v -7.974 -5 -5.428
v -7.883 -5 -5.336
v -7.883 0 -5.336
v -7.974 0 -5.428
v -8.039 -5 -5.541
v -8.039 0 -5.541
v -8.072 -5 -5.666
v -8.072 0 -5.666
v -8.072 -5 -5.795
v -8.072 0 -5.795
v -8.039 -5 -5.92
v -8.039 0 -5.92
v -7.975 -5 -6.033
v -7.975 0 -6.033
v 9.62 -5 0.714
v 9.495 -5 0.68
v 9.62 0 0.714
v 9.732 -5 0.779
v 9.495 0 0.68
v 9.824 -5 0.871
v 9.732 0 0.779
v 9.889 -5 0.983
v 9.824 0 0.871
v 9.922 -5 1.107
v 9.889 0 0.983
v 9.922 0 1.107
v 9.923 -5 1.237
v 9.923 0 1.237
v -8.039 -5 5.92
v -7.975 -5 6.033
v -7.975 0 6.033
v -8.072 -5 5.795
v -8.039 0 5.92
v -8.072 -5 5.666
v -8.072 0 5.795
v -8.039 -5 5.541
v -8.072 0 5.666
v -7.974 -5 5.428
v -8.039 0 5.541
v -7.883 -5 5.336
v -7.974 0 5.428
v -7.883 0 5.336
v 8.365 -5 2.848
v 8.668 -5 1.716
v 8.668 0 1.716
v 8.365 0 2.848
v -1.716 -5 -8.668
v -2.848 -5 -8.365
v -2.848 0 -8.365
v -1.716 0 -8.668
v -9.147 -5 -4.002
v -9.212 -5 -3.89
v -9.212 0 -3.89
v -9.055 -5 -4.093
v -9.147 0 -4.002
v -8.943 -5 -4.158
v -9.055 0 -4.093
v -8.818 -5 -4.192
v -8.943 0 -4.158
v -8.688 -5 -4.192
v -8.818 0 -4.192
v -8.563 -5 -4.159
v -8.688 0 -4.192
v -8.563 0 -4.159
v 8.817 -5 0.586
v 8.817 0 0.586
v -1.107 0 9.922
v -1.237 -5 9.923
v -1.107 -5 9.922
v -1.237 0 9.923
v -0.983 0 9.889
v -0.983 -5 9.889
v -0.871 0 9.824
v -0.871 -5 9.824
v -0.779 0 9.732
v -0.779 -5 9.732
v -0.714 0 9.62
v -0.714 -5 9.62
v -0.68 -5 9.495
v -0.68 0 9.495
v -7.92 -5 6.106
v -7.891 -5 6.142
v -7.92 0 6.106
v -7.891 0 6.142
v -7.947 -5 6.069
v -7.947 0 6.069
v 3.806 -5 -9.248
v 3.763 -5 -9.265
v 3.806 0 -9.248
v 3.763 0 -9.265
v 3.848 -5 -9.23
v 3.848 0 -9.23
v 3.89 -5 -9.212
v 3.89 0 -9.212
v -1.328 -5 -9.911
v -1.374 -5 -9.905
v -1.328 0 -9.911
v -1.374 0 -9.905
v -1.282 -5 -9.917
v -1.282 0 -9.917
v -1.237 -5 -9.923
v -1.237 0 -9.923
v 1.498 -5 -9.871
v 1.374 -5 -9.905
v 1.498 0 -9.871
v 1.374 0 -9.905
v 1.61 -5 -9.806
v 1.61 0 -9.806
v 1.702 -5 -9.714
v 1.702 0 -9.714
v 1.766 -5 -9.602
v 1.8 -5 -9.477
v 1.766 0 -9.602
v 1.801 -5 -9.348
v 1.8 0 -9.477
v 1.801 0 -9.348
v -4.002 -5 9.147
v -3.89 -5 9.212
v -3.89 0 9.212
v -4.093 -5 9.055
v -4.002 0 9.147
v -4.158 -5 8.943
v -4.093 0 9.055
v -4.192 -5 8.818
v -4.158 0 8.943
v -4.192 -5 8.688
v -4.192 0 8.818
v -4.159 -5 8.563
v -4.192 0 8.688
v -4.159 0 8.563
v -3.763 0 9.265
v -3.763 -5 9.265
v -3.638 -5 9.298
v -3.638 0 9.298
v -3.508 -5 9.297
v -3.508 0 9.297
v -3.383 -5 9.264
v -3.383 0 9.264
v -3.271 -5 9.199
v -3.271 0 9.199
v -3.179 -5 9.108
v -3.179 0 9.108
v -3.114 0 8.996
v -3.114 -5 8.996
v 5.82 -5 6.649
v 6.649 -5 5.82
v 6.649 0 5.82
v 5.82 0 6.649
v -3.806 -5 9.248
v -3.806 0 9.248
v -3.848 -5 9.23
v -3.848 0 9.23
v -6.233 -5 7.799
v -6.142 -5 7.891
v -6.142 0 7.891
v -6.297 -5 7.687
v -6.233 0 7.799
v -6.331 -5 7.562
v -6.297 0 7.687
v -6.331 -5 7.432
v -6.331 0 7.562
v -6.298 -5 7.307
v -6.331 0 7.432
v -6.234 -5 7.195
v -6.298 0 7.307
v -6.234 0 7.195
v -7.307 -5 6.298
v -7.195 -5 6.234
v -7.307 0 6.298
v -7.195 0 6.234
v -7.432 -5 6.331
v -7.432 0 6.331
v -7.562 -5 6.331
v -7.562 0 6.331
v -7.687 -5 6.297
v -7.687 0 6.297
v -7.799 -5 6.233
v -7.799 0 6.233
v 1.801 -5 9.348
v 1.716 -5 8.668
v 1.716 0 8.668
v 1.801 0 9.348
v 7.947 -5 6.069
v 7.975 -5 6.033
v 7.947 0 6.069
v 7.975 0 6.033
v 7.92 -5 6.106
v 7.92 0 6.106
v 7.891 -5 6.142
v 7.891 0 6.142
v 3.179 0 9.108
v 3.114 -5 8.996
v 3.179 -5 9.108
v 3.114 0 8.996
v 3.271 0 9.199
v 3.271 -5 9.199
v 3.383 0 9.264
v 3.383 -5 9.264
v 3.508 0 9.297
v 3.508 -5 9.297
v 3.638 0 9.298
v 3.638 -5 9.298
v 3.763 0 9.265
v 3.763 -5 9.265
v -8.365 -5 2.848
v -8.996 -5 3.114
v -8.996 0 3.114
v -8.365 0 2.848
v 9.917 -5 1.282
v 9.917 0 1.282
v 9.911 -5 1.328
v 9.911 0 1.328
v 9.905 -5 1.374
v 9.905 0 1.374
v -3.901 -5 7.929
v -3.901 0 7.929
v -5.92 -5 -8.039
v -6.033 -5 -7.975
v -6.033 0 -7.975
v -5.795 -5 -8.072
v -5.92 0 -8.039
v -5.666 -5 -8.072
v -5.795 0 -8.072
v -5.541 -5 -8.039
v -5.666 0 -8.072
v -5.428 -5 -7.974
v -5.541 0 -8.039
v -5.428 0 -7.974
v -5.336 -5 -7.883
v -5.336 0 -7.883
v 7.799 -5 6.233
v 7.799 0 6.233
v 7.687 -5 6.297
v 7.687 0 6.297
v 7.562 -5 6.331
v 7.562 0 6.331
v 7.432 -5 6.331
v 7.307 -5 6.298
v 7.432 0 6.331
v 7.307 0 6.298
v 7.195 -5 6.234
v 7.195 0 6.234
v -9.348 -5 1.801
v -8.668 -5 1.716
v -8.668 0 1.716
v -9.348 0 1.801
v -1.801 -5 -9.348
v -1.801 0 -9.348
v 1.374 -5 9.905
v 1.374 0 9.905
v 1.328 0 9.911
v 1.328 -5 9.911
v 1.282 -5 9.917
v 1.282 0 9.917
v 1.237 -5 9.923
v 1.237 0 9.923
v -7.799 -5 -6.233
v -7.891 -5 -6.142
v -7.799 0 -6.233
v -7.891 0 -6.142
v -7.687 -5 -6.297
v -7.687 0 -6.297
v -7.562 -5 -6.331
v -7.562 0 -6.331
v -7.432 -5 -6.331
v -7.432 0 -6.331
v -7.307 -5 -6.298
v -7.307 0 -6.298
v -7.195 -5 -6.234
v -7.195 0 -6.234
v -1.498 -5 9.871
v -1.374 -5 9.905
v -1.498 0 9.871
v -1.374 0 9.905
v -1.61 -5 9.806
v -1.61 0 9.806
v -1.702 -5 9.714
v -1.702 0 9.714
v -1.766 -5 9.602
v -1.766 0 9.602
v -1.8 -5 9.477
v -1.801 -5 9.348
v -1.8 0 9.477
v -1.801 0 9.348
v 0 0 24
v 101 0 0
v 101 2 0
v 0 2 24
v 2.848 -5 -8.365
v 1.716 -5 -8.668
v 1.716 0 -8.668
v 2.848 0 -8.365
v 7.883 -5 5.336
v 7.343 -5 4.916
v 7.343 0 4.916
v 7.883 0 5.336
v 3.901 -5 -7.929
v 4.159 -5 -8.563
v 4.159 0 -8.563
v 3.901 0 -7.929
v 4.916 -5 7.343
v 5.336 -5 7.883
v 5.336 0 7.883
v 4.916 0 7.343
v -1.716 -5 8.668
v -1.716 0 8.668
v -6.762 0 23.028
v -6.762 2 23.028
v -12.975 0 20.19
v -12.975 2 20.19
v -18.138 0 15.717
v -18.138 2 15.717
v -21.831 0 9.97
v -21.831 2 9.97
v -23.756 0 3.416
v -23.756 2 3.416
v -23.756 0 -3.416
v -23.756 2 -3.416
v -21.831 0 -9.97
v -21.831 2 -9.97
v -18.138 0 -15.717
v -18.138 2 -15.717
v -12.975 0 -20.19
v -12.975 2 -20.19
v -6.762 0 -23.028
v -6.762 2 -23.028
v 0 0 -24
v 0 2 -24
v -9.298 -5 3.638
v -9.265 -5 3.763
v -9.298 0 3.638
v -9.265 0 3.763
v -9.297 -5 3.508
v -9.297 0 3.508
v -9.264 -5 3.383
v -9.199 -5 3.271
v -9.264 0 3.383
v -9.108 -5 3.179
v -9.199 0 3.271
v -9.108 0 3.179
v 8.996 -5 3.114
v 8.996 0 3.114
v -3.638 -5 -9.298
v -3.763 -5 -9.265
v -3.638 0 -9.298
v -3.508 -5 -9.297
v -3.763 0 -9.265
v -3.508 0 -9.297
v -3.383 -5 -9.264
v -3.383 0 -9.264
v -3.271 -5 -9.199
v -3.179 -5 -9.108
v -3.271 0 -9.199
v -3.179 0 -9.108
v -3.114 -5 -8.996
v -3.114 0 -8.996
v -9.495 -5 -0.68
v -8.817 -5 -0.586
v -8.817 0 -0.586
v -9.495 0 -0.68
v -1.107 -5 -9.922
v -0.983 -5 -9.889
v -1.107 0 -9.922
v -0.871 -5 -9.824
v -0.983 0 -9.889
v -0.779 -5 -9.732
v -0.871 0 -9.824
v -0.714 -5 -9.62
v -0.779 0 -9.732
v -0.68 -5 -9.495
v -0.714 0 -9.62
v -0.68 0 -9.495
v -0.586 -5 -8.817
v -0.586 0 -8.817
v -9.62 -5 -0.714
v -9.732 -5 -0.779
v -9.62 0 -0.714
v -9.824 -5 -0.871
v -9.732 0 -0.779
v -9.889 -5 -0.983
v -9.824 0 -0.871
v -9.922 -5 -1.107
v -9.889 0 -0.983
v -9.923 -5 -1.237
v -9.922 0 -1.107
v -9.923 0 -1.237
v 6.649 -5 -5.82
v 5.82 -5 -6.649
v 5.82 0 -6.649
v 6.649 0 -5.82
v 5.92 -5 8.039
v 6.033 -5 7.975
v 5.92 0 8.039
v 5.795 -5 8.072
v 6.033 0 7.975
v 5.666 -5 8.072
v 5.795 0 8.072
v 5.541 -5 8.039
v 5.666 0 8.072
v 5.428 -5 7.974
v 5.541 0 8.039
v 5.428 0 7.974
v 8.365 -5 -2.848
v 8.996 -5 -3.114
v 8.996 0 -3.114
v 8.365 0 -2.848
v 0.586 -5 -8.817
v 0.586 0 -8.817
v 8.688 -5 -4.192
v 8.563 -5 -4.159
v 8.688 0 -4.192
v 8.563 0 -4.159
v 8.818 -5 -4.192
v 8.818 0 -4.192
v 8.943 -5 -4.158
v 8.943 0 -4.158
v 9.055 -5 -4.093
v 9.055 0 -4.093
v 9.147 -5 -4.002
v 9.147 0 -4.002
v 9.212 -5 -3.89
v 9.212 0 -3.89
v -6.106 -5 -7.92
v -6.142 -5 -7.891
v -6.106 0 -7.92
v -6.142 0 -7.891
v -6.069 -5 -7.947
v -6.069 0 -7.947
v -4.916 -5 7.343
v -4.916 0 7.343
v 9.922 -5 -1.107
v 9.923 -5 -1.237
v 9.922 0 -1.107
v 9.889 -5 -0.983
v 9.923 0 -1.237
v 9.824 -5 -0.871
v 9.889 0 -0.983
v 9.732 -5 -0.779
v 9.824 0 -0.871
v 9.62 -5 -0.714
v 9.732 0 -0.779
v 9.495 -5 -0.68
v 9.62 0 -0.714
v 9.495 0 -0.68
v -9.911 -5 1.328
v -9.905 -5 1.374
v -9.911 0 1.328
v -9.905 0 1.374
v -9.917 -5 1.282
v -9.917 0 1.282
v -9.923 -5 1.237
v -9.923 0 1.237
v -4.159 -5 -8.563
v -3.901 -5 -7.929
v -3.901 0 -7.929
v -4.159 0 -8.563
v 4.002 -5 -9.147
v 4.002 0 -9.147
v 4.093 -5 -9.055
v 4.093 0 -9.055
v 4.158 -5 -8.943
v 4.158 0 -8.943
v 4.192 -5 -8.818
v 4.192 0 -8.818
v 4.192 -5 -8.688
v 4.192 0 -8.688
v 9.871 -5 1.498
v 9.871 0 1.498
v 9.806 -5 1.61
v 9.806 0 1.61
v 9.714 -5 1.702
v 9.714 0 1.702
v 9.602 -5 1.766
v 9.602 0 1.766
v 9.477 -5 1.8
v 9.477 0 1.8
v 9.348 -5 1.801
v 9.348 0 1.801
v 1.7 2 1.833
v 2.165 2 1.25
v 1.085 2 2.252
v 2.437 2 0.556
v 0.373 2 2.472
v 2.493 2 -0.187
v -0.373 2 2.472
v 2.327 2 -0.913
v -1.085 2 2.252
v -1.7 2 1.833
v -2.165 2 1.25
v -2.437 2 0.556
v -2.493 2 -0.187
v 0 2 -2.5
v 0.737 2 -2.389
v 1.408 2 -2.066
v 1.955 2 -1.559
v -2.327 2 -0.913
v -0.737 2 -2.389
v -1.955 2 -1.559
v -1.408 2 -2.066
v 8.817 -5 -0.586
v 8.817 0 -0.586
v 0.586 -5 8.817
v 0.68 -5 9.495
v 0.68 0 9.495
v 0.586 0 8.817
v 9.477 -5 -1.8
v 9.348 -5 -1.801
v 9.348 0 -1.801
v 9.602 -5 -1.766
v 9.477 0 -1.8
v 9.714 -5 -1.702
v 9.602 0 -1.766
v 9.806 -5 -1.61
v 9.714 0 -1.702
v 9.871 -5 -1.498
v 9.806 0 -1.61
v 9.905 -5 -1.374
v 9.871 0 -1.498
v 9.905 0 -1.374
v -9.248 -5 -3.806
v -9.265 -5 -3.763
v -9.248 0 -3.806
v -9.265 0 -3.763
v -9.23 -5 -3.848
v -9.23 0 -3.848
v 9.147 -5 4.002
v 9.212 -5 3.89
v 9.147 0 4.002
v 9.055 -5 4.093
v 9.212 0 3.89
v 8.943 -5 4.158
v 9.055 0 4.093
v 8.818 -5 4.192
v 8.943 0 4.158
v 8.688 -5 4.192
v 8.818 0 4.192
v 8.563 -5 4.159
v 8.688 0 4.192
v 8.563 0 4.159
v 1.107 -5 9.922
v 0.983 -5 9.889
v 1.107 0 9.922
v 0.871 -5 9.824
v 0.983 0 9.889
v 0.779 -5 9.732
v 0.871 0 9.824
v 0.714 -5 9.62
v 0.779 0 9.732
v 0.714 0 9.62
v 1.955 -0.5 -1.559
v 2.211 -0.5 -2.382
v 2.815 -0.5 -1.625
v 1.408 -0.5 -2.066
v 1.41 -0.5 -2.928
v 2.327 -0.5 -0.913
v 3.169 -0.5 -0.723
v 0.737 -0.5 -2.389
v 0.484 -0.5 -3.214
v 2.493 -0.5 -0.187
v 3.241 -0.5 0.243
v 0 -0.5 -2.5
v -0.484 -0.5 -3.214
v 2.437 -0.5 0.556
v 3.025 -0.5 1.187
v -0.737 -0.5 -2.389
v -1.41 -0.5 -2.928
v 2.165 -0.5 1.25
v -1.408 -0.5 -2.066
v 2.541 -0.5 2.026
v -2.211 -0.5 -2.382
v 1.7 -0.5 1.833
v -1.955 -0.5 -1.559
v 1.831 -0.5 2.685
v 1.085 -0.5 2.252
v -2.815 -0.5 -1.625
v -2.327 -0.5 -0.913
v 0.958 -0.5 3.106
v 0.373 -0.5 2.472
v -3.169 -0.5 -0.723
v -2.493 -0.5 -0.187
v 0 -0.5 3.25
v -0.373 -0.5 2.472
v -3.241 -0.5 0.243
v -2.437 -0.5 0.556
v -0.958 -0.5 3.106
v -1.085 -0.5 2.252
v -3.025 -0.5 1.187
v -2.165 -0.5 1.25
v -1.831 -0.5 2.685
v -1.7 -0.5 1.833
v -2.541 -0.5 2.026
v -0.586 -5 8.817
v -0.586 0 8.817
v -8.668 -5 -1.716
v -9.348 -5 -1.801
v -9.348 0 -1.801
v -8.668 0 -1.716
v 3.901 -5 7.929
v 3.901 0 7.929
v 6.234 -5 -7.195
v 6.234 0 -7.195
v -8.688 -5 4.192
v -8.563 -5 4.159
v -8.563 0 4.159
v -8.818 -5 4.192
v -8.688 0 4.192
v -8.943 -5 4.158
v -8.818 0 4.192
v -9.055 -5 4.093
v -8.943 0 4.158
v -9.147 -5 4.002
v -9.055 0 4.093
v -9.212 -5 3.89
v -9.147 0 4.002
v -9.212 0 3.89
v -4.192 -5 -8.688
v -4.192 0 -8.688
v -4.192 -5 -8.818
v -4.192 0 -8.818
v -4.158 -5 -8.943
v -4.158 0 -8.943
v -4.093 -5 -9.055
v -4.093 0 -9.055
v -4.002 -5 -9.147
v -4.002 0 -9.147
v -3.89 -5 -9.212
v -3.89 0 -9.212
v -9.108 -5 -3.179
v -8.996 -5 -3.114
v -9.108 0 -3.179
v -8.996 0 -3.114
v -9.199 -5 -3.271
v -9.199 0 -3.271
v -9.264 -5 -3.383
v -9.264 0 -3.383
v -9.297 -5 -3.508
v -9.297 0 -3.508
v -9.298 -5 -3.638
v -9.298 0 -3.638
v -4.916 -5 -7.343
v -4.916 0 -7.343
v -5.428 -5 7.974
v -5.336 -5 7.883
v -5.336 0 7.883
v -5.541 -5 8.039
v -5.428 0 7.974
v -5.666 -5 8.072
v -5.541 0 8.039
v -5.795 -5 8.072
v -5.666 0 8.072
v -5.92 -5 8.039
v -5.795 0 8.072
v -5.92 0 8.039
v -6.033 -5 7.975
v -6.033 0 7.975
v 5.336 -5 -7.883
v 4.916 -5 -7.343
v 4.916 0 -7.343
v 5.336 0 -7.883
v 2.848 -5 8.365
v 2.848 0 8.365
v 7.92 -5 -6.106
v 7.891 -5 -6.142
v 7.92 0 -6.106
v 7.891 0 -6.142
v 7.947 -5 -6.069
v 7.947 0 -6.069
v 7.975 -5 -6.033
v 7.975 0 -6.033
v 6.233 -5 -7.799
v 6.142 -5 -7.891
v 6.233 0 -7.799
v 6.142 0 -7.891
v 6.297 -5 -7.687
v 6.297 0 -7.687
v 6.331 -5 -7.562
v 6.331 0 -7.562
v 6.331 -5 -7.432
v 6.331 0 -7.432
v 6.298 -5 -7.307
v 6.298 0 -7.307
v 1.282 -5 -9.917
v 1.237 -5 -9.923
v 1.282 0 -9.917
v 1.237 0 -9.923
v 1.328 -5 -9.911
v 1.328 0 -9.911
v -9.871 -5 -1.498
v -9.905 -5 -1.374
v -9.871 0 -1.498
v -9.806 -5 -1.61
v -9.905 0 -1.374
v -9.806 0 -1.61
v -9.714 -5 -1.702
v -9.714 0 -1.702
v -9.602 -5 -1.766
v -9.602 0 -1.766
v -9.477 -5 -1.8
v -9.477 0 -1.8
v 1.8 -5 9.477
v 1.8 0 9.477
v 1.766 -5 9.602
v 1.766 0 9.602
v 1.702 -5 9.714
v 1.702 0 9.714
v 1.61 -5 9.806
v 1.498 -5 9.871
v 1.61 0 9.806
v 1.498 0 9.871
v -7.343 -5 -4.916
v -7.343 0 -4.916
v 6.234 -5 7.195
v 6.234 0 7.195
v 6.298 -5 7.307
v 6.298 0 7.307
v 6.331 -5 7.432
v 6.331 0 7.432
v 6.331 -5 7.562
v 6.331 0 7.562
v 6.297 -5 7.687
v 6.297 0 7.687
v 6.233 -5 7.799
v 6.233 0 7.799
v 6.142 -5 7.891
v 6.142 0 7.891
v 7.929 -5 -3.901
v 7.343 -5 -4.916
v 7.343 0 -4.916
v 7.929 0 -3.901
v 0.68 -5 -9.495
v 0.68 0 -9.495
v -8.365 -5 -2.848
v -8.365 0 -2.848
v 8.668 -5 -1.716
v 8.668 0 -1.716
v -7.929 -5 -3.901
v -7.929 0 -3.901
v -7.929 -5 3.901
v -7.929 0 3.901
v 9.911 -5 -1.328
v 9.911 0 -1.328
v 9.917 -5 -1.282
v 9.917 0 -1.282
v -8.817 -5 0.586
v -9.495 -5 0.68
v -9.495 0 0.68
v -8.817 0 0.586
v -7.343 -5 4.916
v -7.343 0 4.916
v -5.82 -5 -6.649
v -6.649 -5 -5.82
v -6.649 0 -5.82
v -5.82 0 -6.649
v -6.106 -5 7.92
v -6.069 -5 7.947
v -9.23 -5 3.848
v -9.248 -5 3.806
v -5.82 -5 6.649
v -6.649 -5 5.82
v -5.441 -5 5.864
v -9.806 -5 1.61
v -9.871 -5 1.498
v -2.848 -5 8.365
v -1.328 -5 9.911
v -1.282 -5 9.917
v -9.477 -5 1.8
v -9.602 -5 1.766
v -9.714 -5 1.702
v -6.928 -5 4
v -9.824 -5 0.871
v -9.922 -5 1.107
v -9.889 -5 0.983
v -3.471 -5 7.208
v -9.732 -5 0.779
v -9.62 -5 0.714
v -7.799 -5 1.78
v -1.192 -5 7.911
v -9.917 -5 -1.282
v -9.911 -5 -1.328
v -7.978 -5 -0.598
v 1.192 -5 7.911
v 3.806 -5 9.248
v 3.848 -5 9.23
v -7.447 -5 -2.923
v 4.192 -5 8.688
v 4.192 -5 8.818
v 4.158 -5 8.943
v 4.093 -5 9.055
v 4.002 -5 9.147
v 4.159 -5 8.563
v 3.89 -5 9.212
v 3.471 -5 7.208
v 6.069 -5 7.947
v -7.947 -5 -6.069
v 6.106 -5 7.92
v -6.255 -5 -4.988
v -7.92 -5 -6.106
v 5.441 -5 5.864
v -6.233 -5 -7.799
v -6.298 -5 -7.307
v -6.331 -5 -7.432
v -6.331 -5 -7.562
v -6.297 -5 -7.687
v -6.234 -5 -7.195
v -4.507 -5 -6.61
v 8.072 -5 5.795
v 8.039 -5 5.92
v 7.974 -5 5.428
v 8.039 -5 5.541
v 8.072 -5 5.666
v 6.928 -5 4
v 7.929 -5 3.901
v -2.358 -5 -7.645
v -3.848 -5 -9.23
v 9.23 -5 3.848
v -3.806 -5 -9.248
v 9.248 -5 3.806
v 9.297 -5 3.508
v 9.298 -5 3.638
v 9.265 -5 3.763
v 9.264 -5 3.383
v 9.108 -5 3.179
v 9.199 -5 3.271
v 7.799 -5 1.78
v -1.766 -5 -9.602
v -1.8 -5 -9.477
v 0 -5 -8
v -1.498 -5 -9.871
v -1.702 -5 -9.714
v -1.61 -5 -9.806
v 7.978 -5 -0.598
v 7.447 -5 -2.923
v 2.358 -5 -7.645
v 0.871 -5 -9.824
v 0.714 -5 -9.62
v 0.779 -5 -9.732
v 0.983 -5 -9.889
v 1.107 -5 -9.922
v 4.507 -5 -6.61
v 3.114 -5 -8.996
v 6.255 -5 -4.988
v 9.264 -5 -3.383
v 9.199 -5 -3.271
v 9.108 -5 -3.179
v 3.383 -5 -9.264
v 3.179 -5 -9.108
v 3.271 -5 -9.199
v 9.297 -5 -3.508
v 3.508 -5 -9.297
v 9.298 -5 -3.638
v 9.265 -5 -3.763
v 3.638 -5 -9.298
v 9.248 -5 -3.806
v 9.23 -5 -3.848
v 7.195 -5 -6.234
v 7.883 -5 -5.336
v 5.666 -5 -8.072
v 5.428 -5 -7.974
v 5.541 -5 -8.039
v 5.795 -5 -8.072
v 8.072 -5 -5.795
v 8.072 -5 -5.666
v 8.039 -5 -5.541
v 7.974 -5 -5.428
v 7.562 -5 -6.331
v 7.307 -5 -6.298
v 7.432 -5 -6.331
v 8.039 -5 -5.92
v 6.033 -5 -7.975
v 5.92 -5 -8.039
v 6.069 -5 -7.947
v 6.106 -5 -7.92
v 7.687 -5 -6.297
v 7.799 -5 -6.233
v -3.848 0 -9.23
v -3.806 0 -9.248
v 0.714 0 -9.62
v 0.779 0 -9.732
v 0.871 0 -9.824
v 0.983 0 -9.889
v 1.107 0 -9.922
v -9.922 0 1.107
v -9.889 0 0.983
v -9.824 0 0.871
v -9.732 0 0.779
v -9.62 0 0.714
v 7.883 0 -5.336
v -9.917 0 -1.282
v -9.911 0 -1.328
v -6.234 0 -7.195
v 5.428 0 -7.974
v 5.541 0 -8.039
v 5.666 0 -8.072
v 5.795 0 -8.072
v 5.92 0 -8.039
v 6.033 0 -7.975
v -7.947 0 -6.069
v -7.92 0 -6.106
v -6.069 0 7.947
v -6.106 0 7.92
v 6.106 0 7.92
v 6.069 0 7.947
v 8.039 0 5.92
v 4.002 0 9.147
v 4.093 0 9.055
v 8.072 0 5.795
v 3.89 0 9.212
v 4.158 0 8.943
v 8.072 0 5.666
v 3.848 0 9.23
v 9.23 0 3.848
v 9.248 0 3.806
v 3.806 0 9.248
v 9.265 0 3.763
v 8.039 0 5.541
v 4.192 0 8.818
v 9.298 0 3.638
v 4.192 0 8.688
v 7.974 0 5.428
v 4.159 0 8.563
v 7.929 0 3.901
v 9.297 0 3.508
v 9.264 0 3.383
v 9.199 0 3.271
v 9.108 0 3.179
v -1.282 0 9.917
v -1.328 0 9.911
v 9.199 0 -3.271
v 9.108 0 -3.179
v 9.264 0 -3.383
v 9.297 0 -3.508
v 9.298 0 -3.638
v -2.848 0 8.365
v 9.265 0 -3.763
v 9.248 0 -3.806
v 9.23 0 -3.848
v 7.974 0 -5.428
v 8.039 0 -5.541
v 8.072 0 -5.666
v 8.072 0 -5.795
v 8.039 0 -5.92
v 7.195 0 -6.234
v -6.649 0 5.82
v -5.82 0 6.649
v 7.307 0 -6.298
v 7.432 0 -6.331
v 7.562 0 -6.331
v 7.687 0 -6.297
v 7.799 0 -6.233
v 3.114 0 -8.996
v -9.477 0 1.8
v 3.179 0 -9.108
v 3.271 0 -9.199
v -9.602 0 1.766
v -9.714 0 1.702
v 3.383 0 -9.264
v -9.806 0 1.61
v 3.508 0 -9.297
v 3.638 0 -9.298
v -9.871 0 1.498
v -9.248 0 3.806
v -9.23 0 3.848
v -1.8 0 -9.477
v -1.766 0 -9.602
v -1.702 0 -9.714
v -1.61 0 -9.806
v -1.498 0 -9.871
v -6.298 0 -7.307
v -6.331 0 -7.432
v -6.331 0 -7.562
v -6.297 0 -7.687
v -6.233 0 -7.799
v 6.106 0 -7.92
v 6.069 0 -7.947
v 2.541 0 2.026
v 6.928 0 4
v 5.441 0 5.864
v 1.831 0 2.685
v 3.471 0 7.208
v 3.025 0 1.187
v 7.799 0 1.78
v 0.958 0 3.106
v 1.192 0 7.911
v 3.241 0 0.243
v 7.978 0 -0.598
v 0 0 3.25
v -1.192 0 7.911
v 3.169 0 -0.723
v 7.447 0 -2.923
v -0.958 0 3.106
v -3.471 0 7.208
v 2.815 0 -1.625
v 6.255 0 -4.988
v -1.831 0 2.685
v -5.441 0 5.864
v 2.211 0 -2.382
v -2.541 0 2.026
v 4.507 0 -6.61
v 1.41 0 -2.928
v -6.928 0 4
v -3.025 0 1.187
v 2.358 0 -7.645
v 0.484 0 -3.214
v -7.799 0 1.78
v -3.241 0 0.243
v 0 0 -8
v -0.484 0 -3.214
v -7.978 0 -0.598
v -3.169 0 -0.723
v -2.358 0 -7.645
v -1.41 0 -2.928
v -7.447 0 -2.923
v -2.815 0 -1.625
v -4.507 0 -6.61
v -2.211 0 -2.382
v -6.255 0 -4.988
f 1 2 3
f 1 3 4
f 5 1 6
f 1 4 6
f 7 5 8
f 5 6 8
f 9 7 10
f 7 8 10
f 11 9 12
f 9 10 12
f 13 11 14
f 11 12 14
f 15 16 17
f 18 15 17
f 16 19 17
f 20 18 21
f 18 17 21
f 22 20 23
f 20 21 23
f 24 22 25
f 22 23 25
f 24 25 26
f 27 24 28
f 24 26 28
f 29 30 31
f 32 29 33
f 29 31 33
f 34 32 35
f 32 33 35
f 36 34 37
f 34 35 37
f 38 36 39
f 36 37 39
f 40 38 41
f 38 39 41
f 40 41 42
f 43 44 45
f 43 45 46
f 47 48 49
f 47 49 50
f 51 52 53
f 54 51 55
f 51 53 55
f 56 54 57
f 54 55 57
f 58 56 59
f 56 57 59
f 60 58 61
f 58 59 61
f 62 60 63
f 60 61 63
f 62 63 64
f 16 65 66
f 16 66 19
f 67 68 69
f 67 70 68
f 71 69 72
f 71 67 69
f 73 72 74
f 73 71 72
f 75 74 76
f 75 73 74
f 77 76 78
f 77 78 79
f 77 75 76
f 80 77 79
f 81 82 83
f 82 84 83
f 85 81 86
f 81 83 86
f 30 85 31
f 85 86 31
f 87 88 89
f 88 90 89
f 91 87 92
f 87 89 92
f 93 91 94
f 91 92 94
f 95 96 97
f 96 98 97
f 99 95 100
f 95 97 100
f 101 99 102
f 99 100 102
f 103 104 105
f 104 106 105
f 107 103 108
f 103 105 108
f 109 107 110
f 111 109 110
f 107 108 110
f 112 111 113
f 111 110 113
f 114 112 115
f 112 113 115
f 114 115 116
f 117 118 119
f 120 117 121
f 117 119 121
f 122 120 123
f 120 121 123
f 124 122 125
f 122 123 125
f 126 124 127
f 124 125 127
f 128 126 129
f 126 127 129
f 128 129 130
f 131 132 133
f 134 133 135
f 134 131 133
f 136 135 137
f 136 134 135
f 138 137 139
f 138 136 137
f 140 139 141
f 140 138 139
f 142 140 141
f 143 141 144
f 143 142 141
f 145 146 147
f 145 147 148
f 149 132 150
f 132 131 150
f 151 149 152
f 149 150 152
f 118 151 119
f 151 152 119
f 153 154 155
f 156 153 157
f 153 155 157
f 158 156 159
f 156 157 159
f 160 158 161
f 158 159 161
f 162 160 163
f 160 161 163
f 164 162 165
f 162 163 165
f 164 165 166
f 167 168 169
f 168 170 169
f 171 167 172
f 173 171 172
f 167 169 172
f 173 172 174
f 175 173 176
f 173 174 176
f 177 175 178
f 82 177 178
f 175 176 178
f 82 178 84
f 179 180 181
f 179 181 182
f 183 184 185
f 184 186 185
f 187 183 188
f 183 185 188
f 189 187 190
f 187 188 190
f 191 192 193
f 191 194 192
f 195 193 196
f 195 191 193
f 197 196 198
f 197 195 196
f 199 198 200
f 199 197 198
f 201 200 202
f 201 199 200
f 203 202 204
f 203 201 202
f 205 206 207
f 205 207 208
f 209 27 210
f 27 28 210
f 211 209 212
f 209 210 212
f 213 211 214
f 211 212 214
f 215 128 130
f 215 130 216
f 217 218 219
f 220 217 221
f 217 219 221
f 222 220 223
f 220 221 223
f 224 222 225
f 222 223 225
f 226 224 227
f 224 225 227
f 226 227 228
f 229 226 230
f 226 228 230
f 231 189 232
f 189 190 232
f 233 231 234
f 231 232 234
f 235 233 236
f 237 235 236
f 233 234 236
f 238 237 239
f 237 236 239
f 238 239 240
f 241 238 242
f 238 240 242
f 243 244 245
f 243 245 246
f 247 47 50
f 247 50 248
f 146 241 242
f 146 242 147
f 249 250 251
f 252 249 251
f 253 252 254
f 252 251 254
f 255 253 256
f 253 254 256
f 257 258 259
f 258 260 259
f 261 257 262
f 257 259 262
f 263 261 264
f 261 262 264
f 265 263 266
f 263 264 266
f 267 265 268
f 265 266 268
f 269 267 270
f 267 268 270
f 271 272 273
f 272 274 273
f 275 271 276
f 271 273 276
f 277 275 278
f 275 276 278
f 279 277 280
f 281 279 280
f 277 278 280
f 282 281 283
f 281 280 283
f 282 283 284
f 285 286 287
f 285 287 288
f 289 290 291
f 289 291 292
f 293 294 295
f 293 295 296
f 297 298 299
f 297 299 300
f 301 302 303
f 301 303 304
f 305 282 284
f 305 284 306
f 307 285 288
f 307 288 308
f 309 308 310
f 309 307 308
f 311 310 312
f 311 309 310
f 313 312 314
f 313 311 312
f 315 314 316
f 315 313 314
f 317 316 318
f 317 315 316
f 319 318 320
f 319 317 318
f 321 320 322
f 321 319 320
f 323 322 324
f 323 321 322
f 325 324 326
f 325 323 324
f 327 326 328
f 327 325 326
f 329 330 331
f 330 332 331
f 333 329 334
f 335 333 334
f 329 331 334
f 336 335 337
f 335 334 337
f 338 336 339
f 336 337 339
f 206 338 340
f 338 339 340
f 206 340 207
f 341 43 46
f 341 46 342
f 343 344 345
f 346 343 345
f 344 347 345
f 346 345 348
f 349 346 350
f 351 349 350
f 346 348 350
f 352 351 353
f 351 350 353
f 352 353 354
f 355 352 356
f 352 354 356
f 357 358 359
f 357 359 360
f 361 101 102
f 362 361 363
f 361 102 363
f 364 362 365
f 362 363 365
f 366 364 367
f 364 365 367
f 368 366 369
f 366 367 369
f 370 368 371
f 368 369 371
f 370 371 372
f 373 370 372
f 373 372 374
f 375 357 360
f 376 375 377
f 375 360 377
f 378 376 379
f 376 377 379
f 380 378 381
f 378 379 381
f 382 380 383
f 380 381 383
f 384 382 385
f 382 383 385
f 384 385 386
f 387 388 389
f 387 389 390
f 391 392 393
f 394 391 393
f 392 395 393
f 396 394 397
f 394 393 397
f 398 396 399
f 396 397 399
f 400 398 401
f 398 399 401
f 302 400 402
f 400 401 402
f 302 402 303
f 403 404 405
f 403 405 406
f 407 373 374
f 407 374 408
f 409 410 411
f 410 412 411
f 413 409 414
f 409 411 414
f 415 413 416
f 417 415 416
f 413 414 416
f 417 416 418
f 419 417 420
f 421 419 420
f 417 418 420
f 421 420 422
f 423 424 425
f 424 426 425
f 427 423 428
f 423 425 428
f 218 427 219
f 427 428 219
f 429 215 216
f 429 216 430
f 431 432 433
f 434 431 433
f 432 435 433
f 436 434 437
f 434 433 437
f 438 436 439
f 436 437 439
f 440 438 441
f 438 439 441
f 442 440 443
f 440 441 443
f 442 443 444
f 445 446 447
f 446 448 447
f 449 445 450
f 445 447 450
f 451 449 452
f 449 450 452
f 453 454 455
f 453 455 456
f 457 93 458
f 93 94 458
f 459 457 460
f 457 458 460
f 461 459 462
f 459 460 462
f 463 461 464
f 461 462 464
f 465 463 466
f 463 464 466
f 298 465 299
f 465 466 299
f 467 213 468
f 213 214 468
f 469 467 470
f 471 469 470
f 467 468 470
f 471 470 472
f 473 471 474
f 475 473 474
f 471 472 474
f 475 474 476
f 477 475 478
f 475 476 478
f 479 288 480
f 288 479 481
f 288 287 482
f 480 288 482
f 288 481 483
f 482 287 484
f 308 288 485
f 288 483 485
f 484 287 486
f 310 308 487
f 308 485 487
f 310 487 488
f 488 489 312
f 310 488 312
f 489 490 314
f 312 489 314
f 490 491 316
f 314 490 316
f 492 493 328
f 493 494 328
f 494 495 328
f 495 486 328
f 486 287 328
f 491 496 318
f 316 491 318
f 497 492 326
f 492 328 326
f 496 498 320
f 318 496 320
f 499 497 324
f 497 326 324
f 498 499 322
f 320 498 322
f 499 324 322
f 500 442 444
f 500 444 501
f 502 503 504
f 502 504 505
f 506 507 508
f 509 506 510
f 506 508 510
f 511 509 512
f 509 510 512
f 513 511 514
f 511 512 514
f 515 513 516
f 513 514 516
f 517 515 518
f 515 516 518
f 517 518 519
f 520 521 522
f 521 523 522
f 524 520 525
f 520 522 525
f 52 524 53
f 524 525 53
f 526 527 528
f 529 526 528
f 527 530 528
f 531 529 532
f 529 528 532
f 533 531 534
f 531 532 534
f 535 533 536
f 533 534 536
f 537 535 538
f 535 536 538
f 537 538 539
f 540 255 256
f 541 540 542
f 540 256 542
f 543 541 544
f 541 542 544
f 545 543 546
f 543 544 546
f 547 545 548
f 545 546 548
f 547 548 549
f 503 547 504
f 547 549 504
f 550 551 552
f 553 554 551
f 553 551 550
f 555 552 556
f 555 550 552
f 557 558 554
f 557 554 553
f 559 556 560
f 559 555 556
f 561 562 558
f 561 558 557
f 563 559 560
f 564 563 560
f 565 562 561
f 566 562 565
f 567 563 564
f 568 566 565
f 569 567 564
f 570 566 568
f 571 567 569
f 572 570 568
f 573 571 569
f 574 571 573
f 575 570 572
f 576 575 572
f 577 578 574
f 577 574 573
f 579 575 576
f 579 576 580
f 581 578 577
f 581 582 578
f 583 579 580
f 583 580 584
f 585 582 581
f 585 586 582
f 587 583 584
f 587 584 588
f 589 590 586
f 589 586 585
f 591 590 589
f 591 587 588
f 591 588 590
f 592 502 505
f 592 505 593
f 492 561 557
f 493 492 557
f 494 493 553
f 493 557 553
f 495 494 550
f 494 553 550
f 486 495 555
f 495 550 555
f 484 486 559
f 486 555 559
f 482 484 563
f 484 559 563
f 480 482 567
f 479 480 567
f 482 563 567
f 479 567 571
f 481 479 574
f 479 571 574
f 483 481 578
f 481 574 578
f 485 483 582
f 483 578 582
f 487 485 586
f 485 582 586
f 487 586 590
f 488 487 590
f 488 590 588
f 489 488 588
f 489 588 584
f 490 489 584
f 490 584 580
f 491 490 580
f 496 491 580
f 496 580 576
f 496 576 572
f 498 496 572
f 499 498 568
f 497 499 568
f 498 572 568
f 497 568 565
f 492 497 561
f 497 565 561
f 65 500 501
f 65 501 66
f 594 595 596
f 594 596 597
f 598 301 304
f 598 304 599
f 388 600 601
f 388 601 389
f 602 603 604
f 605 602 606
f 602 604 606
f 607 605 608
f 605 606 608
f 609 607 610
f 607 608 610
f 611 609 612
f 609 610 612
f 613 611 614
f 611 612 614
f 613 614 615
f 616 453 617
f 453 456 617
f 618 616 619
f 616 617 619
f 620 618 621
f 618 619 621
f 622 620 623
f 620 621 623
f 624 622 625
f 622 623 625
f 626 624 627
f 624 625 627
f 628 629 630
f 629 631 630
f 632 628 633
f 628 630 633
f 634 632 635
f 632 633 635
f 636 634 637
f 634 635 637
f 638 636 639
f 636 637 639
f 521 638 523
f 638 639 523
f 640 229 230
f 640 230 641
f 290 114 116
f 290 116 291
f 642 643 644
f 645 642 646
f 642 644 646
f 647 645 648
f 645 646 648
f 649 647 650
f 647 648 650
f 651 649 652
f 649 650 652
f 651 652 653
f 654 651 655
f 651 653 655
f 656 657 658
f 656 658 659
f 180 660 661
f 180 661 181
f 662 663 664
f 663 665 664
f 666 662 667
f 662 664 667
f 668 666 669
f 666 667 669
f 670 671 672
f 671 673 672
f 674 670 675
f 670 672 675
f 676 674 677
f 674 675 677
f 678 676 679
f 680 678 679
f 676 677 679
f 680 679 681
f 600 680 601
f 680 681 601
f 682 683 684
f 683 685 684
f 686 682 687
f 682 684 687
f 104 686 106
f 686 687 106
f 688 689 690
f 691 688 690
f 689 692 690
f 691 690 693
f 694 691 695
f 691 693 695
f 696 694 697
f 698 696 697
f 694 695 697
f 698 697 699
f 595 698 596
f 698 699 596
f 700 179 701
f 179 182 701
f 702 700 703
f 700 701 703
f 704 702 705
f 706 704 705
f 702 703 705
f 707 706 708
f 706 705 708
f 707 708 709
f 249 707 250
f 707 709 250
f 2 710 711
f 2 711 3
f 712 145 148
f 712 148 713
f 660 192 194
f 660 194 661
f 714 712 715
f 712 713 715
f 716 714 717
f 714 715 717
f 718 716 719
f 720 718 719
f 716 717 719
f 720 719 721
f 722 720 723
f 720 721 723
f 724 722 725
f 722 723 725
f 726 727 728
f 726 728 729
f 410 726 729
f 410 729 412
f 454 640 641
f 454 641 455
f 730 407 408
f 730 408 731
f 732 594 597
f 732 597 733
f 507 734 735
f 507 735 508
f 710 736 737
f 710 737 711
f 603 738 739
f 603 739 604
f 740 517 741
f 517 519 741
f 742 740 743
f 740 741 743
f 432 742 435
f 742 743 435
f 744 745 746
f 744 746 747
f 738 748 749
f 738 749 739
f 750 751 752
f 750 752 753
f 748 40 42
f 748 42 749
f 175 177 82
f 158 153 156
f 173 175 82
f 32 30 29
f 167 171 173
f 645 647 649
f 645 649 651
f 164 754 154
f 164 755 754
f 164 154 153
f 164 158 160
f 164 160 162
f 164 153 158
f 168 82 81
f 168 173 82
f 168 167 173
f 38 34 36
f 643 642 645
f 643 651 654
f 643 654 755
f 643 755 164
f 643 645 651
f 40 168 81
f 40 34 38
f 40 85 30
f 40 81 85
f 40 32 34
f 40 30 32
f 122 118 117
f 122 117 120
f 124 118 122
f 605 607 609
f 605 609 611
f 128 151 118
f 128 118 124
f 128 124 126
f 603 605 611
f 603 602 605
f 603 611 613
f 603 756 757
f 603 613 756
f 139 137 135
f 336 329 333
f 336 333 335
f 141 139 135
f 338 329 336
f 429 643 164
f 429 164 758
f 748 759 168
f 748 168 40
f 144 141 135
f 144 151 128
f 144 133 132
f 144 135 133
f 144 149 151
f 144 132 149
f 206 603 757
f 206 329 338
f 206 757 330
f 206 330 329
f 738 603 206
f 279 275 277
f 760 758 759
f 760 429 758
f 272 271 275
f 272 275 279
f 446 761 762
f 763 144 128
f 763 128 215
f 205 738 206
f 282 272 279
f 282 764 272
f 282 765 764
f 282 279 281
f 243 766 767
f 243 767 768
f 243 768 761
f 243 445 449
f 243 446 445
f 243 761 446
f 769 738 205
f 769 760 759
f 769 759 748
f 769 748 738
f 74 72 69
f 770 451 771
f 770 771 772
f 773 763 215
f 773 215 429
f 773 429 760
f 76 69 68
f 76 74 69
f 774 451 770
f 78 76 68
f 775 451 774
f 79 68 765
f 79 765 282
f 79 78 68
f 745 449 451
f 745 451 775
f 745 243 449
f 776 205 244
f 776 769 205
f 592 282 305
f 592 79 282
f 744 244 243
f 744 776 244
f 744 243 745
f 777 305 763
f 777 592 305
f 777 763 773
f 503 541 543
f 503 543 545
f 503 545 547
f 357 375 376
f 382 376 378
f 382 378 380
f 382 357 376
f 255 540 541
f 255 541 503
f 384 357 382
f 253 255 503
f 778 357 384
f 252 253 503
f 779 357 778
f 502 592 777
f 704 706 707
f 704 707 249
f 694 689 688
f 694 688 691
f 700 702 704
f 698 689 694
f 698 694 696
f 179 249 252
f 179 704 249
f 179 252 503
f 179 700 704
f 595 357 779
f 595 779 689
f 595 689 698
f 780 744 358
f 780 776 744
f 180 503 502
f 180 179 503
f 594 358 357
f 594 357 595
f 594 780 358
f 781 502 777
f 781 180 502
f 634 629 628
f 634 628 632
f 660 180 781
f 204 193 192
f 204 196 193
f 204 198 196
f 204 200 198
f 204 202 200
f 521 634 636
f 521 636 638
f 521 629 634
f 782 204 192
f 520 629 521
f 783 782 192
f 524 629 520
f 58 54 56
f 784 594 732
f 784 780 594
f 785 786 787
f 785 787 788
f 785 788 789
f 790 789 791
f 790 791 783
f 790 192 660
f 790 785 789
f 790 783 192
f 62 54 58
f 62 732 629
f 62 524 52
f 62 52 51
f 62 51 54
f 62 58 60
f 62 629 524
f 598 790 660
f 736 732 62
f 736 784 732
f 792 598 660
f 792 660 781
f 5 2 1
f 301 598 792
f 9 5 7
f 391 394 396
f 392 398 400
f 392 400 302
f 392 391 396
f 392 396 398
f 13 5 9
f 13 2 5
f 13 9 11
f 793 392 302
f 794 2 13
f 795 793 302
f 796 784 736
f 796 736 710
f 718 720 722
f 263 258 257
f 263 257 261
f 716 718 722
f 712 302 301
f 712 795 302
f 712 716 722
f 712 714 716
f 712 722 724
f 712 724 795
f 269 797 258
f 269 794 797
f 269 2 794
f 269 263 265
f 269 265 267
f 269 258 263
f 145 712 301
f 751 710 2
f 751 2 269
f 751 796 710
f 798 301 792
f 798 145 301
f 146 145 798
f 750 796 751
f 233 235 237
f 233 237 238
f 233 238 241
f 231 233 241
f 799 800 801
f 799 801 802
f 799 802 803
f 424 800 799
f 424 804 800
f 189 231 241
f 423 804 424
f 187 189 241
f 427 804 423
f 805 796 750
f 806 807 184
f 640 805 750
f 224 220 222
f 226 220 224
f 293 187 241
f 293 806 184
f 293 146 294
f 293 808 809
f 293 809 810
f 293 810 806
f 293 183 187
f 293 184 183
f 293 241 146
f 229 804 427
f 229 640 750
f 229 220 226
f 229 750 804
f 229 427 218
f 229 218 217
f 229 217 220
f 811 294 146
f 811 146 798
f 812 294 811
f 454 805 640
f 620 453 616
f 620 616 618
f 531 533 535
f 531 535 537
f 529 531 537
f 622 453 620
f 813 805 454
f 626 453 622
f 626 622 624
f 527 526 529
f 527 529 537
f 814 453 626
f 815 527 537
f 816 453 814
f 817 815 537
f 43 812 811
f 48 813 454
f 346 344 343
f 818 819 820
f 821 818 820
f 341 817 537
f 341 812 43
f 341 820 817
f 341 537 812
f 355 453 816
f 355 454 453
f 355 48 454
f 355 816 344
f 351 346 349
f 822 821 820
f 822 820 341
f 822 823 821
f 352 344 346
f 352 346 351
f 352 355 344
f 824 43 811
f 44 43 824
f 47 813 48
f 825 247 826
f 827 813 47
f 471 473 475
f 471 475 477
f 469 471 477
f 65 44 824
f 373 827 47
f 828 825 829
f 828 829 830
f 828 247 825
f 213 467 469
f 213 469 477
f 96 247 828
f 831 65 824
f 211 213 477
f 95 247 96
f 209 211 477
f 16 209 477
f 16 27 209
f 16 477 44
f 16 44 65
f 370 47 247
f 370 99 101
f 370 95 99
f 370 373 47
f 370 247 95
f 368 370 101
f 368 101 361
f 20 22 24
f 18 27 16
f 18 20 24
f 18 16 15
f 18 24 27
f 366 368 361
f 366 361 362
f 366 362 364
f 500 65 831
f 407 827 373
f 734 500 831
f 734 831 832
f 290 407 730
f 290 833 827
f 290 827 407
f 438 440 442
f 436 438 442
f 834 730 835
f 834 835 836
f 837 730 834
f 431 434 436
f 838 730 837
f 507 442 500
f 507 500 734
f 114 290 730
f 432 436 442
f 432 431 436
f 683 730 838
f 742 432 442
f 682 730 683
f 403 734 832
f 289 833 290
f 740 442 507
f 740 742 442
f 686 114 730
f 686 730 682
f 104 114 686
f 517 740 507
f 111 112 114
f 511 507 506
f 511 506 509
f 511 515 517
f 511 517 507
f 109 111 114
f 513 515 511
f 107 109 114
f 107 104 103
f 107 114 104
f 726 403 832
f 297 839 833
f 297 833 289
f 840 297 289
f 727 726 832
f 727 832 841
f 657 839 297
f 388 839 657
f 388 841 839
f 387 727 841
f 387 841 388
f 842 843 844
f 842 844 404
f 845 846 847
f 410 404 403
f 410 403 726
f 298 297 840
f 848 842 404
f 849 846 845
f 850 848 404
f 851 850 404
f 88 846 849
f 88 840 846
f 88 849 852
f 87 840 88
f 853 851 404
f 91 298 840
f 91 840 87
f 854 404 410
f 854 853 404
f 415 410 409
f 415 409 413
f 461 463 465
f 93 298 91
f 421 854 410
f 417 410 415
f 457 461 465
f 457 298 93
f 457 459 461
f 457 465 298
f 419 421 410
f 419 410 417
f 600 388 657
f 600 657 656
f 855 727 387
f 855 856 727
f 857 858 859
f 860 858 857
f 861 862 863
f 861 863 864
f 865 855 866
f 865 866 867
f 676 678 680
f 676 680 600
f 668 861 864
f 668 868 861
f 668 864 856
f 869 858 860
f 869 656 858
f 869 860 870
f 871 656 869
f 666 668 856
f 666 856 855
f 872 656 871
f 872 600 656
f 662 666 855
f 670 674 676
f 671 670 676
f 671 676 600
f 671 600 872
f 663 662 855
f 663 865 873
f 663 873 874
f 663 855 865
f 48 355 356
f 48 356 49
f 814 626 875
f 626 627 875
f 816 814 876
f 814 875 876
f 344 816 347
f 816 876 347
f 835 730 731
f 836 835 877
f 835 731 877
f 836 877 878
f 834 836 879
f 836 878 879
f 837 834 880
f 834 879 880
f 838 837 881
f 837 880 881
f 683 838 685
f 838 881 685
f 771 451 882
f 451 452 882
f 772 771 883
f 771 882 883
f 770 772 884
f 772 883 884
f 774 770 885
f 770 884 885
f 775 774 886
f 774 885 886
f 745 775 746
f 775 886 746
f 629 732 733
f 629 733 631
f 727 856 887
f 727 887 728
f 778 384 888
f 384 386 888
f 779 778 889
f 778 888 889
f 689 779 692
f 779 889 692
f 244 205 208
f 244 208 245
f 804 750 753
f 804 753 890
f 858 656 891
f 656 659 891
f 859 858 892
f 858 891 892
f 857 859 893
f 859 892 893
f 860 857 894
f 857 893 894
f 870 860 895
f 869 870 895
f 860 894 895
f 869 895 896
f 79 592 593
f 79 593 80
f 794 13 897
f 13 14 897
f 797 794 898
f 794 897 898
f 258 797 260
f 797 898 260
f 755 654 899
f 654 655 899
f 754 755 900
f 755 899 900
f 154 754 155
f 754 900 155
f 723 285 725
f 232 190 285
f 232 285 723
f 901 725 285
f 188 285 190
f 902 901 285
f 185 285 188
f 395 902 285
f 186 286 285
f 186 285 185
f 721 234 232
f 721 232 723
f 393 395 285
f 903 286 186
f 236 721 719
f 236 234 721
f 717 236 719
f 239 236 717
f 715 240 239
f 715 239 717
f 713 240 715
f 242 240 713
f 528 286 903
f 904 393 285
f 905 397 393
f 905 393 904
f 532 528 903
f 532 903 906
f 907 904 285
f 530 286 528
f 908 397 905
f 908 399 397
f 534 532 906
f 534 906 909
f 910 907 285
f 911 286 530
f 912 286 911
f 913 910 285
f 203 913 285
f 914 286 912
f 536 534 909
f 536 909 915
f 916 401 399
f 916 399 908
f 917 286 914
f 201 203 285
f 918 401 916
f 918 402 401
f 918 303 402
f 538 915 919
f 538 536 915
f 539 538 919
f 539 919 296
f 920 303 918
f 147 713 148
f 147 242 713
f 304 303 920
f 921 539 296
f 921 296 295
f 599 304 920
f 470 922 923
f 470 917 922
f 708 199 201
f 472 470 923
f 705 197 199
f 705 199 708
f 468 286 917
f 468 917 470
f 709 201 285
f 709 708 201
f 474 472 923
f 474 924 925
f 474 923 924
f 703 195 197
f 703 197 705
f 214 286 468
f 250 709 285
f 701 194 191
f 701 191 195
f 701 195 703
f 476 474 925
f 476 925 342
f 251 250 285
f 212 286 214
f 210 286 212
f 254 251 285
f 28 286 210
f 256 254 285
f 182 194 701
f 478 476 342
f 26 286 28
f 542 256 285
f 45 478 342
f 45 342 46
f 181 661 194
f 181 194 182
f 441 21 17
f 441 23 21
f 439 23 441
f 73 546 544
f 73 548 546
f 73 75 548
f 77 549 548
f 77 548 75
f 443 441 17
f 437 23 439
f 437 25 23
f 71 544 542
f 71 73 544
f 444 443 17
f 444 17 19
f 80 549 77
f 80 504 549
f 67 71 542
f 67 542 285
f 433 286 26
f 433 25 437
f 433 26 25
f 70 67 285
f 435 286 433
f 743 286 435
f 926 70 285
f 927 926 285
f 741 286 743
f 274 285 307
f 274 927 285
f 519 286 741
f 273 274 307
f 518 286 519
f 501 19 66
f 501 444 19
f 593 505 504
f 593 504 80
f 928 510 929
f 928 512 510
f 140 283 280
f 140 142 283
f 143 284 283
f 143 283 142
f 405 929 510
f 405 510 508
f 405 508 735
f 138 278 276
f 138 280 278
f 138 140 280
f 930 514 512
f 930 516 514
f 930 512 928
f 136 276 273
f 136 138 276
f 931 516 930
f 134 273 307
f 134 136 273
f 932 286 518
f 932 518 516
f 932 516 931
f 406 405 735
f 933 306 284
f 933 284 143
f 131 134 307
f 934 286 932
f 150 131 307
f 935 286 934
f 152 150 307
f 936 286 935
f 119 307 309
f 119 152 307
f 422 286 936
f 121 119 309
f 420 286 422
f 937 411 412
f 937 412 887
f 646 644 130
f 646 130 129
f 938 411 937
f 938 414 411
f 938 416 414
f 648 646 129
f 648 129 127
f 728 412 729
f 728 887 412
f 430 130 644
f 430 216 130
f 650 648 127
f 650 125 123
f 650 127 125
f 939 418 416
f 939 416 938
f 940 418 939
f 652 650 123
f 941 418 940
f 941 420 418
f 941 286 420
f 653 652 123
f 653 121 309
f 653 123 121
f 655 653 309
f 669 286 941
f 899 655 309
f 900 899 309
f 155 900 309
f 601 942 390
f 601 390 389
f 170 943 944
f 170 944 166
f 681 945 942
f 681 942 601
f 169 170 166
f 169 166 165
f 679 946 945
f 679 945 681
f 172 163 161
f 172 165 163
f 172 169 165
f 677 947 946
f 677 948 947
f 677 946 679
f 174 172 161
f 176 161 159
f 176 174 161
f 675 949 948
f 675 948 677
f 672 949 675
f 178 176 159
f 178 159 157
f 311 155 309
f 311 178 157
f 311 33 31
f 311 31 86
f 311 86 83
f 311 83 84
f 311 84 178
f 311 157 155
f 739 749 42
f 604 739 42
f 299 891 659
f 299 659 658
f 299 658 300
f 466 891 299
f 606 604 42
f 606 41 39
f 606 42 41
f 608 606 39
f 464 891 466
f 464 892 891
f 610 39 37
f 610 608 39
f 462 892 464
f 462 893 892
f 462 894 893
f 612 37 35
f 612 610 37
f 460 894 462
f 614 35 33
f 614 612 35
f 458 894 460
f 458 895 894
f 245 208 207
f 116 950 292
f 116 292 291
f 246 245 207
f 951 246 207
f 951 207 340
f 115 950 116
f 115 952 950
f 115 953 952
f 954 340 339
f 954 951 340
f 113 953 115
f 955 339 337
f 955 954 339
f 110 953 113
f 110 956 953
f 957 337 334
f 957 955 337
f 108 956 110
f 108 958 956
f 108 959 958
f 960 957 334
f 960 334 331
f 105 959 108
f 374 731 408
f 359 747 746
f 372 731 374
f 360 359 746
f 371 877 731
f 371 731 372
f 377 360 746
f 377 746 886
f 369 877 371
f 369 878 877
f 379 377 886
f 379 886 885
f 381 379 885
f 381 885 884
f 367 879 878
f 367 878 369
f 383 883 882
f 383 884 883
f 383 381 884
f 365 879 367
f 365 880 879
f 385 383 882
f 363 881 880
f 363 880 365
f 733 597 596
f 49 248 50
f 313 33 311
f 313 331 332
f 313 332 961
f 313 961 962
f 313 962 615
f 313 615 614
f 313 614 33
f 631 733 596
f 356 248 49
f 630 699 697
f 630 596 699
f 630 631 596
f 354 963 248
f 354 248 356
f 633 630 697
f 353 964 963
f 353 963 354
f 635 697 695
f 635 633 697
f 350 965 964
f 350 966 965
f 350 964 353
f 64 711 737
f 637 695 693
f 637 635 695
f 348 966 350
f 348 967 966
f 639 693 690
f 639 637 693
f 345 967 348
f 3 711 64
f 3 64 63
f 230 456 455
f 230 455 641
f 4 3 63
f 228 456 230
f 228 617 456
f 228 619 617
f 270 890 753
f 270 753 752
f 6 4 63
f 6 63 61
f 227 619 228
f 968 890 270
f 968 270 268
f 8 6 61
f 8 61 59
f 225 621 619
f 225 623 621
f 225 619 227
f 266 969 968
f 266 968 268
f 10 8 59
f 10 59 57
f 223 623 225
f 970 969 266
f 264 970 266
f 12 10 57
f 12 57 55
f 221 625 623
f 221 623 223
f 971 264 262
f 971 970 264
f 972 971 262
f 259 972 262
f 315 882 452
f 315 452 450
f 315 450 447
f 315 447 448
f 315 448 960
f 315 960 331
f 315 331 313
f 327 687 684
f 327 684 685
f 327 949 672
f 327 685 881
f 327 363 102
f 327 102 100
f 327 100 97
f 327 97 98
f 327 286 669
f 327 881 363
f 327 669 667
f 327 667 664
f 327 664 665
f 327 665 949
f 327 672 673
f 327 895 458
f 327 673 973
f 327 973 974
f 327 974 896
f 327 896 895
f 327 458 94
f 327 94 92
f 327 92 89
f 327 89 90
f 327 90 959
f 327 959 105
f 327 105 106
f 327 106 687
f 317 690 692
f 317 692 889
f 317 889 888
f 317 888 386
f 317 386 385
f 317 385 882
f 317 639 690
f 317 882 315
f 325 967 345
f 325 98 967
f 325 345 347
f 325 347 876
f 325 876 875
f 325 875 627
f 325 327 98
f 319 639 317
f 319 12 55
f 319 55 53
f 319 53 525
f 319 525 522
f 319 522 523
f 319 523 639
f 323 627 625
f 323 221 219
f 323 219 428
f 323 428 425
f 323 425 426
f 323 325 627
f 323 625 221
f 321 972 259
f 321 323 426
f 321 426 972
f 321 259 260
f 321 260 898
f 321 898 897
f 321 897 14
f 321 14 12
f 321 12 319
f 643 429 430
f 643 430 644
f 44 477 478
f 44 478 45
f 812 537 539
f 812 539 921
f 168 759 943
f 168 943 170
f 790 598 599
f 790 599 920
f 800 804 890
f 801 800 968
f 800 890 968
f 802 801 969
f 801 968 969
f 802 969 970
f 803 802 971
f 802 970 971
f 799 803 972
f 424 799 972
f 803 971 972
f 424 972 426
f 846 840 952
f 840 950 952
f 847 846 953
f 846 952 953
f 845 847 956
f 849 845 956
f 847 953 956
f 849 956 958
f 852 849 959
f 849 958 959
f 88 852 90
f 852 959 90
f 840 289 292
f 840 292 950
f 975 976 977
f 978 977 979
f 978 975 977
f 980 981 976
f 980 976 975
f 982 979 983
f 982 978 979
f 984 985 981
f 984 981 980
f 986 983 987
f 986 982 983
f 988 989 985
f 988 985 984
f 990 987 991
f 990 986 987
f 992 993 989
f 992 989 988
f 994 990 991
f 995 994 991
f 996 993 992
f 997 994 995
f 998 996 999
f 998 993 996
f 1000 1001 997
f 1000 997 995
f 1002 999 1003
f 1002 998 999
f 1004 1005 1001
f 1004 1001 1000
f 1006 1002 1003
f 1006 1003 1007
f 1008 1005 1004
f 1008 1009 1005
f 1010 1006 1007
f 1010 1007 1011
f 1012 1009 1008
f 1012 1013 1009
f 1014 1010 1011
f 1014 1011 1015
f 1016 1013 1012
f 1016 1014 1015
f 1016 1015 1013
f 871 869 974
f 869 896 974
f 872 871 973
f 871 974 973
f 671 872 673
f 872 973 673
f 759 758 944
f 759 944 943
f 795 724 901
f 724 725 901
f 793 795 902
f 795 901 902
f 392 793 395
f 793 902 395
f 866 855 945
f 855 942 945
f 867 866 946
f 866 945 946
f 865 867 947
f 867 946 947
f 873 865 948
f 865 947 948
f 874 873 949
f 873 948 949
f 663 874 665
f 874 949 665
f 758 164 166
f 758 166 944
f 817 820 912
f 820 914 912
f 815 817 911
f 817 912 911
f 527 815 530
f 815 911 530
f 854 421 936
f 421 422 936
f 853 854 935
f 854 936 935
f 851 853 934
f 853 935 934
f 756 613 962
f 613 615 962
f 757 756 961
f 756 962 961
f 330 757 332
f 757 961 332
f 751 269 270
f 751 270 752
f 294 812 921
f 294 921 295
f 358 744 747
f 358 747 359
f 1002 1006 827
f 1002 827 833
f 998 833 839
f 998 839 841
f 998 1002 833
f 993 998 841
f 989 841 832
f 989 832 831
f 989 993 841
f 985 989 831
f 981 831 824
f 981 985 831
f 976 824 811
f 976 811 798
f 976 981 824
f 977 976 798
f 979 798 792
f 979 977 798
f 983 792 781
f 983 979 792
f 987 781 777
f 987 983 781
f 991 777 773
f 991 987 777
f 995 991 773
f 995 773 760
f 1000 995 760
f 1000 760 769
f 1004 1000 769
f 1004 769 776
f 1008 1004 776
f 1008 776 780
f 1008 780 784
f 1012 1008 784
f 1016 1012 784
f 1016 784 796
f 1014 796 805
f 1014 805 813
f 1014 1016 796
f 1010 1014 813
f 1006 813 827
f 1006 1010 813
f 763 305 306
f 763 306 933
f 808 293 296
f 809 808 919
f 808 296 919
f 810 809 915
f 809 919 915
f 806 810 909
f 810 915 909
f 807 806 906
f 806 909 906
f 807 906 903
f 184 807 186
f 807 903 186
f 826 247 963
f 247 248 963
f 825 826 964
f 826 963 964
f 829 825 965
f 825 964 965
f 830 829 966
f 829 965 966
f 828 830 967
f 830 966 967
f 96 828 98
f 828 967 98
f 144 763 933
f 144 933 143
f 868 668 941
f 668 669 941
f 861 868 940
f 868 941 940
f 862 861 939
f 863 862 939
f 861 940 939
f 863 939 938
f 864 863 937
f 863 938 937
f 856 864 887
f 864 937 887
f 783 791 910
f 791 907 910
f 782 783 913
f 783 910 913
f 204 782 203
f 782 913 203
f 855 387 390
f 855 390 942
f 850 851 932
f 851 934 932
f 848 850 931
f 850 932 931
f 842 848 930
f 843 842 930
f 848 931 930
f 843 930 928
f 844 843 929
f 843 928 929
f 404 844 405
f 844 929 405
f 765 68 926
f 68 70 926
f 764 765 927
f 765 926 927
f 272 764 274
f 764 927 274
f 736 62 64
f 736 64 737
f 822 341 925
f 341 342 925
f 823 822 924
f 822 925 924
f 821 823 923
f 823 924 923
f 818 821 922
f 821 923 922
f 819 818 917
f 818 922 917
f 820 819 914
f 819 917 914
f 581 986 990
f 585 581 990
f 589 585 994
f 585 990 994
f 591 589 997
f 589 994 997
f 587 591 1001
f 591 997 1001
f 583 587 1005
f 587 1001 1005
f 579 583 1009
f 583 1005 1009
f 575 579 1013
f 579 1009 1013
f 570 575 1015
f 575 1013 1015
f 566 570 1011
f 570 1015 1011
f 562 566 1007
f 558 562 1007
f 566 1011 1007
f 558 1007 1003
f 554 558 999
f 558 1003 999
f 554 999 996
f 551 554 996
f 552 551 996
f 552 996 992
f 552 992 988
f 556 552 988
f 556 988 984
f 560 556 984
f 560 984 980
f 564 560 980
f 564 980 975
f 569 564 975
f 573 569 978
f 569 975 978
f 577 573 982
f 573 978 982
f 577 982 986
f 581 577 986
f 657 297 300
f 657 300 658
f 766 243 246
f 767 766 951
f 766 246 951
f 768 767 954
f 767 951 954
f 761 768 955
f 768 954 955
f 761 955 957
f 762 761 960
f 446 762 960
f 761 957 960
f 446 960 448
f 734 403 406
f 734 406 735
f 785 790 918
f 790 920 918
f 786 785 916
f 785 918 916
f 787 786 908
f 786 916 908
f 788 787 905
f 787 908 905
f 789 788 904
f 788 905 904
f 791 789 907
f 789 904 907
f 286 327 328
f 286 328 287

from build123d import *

# Parameters (mm, degrees)
BOSS_EXTRUDE1_DEPTH      = 2
SKETCH2_R                = 10
SKETCH2_R_2              = 8
BOSS_EXTRUDE2_DEPTH      = 5
SKETCH4_R                = 3.25
BOSS_EXTRUDE3_DEPTH      = 0.5
SKETCH5_R                = 2.5
CUT_EXTRUDE2_DEPTH       = 2.5
CUT_EXTRUDE3_DEPTH       = 5
FILLET1_R                = 0.5
CIRPATTERN5_COUNT        = 24
FILLET1_OF_CIRPATTERN5_R = 0.5


with BuildPart() as part:
    # Sketch1 → Boss-Extrude1 (new body)
    with BuildSketch(Plane(origin=(0, 0, 0), x_dir=(1, 0, 0), z_dir=(0, 1, 0))):
        with BuildLine():
            Line((0, 24), (101, 0))
            Line((101, 0), (0, -24))
            ThreePointArc((0, -24), (-24, 0), (0, 24))
        make_face()
    extrude(amount=BOSS_EXTRUDE1_DEPTH)

    # Sketch2 → Boss-Extrude2 (add)
    with BuildSketch(Plane.XZ):
        with Locations(Location((0, 0, 0), (0, 0, 270))):
            Circle(SKETCH2_R)
        with Locations(Location((0, 0, 0), (0, 0, 270))):
            Circle(SKETCH2_R_2, mode=Mode.SUBTRACT)
    extrude(amount=BOSS_EXTRUDE2_DEPTH)

    # Sketch4 → Boss-Extrude3 (add)
    with BuildSketch(Plane(origin=(0, 0, 0), x_dir=(-1, 0, 0), z_dir=(0, -1, 0))):
        with Locations(Location((0, 0, 0), (0, 0, 270))):
            Circle(SKETCH4_R)
    extrude(amount=BOSS_EXTRUDE3_DEPTH)

    # Sketch5 → Cut-Extrude2 (cut)
    with BuildSketch(Plane.XZ.offset(0.5)):
        with Locations(Location((0, 0, 0), (0, 0, 270))):
            Circle(SKETCH5_R)
    extrude(amount=-CUT_EXTRUDE2_DEPTH, mode=Mode.SUBTRACT)

    # Sketch6 → Cut-Extrude3 (cut)
    with BuildSketch(Plane.XZ.offset(5)):
        Polygon((-1, 11.817203407), (1, 11.817203407), (0.586202372, 8.817203407), (-0.586202372, 8.817203407), align=None)
    cut_extrude3 = extrude(amount=-CUT_EXTRUDE3_DEPTH, mode=Mode.SUBTRACT)

    # Fillet1
    fillet1_edges = [part.edges().sort_by_distance(p)[0] for p in [
        (0.745510128, -2.5, 9.972172013),
        (-0.745510128, -2.5, 9.972172013),
    ]]
    fillet(fillet1_edges, radius=FILLET1_R)

    # CirPattern5: Cut-Extrude3 ×24 about axis
    cirpattern5_axis = Axis((0, 0, 0), (0, 1, 0))
    for i in range(1, CIRPATTERN5_COUNT):
        add(cut_extrude3.rotate(cirpattern5_axis, i * 360 / CIRPATTERN5_COUNT), mode=Mode.SUBTRACT)

    # Fillet1 of CirPattern5
    fillet1_of_cirpattern5_edges = [part.edges().sort_by_distance(p)[0] for p in [
        (3.301095525, -2.5, 9.439426272),
        (1.860880551, -2.5, 9.825330711),
        (5.631716716, -2.5, 8.26339923),
        (4.340455296, -2.5, 9.008909358),
        (7.57854572, -2.5, 6.524235186),
        (6.524235186, -2.5, 7.57854572),
        (9.008909358, -2.5, 4.340455296),
        (8.26339923, -2.5, 5.631716716),
        (9.825330711, -2.5, 1.860880551),
        (9.439426272, -2.5, 3.301095525),
        (9.972172013, -2.5, -0.745510128),
        (9.972172013, -2.5, 0.745510128),
        (9.439426272, -2.5, -3.301095525),
        (9.825330711, -2.5, -1.860880551),
        (8.26339923, -2.5, -5.631716716),
        (9.008909358, -2.5, -4.340455296),
        (6.524235186, -2.5, -7.57854572),
        (7.57854572, -2.5, -6.524235186),
        (4.340455296, -2.5, -9.008909358),
        (5.631716716, -2.5, -8.26339923),
        (1.860880551, -2.5, -9.825330711),
        (3.301095525, -2.5, -9.439426272),
        (-0.745510128, -2.5, -9.972172013),
        (0.745510128, -2.5, -9.972172013),
        (-3.301095525, -2.5, -9.439426272),
        (-1.860880551, -2.5, -9.825330711),
        (-5.631716716, -2.5, -8.26339923),
        (-4.340455296, -2.5, -9.008909358),
        (-7.57854572, -2.5, -6.524235186),
        (-6.524235186, -2.5, -7.57854572),
        (-9.008909358, -2.5, -4.340455296),
        (-8.26339923, -2.5, -5.631716716),
        (-9.825330711, -2.5, -1.860880551),
        (-9.439426272, -2.5, -3.301095525),
        (-9.972172013, -2.5, 0.745510128),
        (-9.972172013, -2.5, -0.745510128),
        (-9.439426272, -2.5, 3.301095525),
        (-9.825330711, -2.5, 1.860880551),
        (-8.26339923, -2.5, 5.631716716),
        (-9.008909358, -2.5, 4.340455296),
        (-6.524235186, -2.5, 7.57854572),
        (-7.57854572, -2.5, 6.524235186),
        (-4.340455296, -2.5, 9.008909358),
        (-5.631716716, -2.5, 8.26339923),
        (-1.860880551, -2.5, 9.825330711),
        (-3.301095525, -2.5, 9.439426272),
    ]]
    fillet(fillet1_of_cirpattern5_edges, radius=FILLET1_OF_CIRPATTERN5_R)


solid = part.part
